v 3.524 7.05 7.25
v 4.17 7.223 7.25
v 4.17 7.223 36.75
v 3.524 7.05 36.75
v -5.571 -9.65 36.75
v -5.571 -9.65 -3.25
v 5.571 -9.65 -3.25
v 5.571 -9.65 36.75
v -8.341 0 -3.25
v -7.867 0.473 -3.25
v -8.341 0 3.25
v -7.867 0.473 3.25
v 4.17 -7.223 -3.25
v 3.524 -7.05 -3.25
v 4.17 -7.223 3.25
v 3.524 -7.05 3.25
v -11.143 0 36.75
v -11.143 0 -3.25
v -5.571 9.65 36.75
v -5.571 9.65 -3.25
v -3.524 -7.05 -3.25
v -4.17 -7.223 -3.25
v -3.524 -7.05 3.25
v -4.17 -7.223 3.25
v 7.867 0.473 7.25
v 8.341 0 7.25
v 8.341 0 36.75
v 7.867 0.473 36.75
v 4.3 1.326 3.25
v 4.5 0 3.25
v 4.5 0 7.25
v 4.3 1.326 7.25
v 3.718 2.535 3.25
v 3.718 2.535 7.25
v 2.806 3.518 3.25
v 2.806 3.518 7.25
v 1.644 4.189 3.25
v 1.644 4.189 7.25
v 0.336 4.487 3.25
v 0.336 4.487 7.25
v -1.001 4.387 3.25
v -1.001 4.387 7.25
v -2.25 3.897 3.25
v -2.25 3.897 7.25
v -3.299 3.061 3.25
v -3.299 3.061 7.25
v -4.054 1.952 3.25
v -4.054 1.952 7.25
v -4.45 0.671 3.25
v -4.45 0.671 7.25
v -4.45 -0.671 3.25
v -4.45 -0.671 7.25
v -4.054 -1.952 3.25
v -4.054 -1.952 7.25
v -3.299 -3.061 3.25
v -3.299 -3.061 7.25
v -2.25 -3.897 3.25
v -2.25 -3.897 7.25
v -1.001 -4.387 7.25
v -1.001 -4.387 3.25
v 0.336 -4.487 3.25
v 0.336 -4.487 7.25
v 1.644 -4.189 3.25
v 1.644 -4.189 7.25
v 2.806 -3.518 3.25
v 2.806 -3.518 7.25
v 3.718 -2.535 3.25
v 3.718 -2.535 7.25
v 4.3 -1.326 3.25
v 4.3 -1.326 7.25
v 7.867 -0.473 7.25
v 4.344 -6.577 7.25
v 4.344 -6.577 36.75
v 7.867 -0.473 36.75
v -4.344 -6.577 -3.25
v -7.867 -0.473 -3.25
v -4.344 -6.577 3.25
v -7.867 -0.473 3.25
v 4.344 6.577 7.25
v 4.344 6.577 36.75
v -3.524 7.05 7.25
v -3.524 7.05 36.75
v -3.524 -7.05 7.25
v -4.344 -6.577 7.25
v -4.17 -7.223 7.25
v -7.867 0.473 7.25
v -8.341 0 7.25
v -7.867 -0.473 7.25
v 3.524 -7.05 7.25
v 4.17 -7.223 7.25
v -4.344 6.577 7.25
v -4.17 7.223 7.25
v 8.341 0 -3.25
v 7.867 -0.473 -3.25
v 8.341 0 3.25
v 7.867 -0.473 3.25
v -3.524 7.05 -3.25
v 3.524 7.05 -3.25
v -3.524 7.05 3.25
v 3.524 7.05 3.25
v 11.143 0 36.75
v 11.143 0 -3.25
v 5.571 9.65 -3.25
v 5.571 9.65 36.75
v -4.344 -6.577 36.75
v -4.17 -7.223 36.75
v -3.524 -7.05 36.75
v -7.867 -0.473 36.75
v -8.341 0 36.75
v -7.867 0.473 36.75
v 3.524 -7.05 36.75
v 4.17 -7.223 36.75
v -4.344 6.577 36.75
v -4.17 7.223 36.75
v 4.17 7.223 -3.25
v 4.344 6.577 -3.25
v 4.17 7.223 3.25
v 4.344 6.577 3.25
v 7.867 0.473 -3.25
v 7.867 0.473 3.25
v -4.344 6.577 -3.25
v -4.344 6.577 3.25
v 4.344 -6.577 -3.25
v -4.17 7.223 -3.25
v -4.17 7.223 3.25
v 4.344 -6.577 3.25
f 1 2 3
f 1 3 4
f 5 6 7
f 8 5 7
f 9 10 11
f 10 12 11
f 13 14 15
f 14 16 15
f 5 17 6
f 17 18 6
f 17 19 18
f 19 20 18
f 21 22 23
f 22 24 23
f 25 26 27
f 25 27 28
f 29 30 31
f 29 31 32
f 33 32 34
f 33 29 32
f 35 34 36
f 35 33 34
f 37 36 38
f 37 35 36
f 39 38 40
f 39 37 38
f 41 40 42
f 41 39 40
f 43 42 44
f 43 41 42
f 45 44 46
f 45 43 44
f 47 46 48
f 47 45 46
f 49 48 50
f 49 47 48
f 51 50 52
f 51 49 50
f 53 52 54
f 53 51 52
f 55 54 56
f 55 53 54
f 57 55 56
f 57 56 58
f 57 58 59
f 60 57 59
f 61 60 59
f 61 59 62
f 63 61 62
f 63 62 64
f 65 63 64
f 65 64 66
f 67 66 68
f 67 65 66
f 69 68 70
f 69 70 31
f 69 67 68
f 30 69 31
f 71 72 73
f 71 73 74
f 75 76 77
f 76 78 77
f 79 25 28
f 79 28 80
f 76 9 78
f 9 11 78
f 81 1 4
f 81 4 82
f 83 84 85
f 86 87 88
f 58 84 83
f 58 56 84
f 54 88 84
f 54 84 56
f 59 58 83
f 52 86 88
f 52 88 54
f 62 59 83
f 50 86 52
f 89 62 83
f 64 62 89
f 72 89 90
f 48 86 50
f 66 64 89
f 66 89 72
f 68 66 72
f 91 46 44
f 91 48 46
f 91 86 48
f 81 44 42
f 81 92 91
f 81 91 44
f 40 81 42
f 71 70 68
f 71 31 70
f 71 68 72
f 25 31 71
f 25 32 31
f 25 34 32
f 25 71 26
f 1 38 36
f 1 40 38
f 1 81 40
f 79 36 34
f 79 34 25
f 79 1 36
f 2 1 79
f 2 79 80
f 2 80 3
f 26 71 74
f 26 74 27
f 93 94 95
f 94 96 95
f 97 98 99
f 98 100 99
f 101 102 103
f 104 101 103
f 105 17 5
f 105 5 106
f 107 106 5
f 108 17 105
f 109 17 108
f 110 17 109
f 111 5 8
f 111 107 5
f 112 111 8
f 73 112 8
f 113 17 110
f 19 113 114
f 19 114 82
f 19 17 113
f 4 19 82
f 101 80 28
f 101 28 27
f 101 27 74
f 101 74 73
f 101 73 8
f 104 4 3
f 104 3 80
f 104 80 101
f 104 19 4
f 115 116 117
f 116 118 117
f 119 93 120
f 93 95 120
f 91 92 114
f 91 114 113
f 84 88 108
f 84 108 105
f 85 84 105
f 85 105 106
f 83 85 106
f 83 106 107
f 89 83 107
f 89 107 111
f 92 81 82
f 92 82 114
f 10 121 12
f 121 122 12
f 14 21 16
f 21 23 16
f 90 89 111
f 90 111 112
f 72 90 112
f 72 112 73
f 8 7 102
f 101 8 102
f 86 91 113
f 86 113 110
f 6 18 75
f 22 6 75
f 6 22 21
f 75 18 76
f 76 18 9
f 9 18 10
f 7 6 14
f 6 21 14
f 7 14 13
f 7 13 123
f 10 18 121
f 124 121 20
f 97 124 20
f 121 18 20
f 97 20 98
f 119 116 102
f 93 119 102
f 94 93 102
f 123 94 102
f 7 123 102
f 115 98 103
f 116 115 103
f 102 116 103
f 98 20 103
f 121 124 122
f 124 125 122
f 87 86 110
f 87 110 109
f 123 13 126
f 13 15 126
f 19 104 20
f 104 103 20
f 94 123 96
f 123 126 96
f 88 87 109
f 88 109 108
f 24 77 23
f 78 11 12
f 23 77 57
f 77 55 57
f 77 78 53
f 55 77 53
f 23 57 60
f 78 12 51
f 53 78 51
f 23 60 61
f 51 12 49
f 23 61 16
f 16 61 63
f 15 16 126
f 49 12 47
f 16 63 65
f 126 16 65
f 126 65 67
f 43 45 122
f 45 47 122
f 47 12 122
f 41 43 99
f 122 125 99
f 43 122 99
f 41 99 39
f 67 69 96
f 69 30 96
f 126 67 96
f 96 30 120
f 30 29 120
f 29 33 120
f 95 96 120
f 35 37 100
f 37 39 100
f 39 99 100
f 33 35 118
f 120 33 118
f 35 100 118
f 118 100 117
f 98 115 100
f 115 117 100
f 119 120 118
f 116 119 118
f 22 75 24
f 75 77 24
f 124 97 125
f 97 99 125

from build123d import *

# Parameters (mm, degrees)
BOTTON_SHAFT_DEPTH = 3.25
SCHIZZO2_R         = 4.5
NUT_BLOCK_DEPTH    = 4
TOP_SHAFT_DEPTH    = 29.5


with BuildPart() as part:
    # Hex-nut-botton → Botton shaft (new, symmetric)
    with BuildSketch(Plane.XY):
        Polygon((11.142860195, 0), (5.571430098, 9.65), (-5.571430098, 9.65), (-11.142860195, 0), (-5.571430098, -9.65), (5.571430098, -9.65), align=None)
        Polygon((7.867433715, 0.473205081), (4.343524479, 6.576794919), (4.170319398, 7.223205081), (3.523909236, 7.05), (-3.523909236, 7.05), (-4.170319398, 7.223205081), (-4.343524479, 6.576794919), (-7.867433715, 0.473205081), (-8.340638796, 0), (-7.867433715, -0.473205081), (-4.343524479, -6.576794919), (-4.170319398, -7.223205081), (-3.523909236, -7.05), (3.523909236, -7.05), (4.170319398, -7.223205081), (4.343524479, -6.576794919), (7.867433715, -0.473205081), (8.340638796, 0), align=None, mode=Mode.SUBTRACT)
    extrude(amount=BOTTON_SHAFT_DEPTH, both=True)

    # Schizzo2 → Nut block (add)
    with BuildSketch(Plane.XY.offset(3.25)):
        Polygon((5.571430098, 9.65), (-5.571430098, 9.65), (-11.142860195, 0), (-5.571430098, -9.65), (5.571430098, -9.65), (11.142860195, 0), align=None)
        Circle(SCHIZZO2_R, mode=Mode.SUBTRACT)
    extrude(amount=NUT_BLOCK_DEPTH)

    # Hex-nut-top → Top shaft (add)
    with BuildSketch(Plane.XY.offset(7.25)):
        Polygon((11.142860195, 0), (5.571430098, 9.65), (-5.571430098, 9.65), (-11.142860195, 0), (-5.571430098, -9.65), (5.571430098, -9.65), align=None)
        Polygon((7.867433715, 0.473205081), (4.343524479, 6.576794919), (4.170319398, 7.223205081), (3.523909236, 7.05), (-3.523909236, 7.05), (-4.170319398, 7.223205081), (-4.343524479, 6.576794919), (-7.867433715, 0.473205081), (-8.340638796, 0), (-7.867433715, -0.473205081), (-4.343524479, -6.576794919), (-4.170319398, -7.223205081), (-3.523909236, -7.05), (3.523909236, -7.05), (4.170319398, -7.223205081), (4.343524479, -6.576794919), (7.867433715, -0.473205081), (8.340638796, 0), align=None, mode=Mode.SUBTRACT)
    extrude(amount=TOP_SHAFT_DEPTH)


solid = part.part
